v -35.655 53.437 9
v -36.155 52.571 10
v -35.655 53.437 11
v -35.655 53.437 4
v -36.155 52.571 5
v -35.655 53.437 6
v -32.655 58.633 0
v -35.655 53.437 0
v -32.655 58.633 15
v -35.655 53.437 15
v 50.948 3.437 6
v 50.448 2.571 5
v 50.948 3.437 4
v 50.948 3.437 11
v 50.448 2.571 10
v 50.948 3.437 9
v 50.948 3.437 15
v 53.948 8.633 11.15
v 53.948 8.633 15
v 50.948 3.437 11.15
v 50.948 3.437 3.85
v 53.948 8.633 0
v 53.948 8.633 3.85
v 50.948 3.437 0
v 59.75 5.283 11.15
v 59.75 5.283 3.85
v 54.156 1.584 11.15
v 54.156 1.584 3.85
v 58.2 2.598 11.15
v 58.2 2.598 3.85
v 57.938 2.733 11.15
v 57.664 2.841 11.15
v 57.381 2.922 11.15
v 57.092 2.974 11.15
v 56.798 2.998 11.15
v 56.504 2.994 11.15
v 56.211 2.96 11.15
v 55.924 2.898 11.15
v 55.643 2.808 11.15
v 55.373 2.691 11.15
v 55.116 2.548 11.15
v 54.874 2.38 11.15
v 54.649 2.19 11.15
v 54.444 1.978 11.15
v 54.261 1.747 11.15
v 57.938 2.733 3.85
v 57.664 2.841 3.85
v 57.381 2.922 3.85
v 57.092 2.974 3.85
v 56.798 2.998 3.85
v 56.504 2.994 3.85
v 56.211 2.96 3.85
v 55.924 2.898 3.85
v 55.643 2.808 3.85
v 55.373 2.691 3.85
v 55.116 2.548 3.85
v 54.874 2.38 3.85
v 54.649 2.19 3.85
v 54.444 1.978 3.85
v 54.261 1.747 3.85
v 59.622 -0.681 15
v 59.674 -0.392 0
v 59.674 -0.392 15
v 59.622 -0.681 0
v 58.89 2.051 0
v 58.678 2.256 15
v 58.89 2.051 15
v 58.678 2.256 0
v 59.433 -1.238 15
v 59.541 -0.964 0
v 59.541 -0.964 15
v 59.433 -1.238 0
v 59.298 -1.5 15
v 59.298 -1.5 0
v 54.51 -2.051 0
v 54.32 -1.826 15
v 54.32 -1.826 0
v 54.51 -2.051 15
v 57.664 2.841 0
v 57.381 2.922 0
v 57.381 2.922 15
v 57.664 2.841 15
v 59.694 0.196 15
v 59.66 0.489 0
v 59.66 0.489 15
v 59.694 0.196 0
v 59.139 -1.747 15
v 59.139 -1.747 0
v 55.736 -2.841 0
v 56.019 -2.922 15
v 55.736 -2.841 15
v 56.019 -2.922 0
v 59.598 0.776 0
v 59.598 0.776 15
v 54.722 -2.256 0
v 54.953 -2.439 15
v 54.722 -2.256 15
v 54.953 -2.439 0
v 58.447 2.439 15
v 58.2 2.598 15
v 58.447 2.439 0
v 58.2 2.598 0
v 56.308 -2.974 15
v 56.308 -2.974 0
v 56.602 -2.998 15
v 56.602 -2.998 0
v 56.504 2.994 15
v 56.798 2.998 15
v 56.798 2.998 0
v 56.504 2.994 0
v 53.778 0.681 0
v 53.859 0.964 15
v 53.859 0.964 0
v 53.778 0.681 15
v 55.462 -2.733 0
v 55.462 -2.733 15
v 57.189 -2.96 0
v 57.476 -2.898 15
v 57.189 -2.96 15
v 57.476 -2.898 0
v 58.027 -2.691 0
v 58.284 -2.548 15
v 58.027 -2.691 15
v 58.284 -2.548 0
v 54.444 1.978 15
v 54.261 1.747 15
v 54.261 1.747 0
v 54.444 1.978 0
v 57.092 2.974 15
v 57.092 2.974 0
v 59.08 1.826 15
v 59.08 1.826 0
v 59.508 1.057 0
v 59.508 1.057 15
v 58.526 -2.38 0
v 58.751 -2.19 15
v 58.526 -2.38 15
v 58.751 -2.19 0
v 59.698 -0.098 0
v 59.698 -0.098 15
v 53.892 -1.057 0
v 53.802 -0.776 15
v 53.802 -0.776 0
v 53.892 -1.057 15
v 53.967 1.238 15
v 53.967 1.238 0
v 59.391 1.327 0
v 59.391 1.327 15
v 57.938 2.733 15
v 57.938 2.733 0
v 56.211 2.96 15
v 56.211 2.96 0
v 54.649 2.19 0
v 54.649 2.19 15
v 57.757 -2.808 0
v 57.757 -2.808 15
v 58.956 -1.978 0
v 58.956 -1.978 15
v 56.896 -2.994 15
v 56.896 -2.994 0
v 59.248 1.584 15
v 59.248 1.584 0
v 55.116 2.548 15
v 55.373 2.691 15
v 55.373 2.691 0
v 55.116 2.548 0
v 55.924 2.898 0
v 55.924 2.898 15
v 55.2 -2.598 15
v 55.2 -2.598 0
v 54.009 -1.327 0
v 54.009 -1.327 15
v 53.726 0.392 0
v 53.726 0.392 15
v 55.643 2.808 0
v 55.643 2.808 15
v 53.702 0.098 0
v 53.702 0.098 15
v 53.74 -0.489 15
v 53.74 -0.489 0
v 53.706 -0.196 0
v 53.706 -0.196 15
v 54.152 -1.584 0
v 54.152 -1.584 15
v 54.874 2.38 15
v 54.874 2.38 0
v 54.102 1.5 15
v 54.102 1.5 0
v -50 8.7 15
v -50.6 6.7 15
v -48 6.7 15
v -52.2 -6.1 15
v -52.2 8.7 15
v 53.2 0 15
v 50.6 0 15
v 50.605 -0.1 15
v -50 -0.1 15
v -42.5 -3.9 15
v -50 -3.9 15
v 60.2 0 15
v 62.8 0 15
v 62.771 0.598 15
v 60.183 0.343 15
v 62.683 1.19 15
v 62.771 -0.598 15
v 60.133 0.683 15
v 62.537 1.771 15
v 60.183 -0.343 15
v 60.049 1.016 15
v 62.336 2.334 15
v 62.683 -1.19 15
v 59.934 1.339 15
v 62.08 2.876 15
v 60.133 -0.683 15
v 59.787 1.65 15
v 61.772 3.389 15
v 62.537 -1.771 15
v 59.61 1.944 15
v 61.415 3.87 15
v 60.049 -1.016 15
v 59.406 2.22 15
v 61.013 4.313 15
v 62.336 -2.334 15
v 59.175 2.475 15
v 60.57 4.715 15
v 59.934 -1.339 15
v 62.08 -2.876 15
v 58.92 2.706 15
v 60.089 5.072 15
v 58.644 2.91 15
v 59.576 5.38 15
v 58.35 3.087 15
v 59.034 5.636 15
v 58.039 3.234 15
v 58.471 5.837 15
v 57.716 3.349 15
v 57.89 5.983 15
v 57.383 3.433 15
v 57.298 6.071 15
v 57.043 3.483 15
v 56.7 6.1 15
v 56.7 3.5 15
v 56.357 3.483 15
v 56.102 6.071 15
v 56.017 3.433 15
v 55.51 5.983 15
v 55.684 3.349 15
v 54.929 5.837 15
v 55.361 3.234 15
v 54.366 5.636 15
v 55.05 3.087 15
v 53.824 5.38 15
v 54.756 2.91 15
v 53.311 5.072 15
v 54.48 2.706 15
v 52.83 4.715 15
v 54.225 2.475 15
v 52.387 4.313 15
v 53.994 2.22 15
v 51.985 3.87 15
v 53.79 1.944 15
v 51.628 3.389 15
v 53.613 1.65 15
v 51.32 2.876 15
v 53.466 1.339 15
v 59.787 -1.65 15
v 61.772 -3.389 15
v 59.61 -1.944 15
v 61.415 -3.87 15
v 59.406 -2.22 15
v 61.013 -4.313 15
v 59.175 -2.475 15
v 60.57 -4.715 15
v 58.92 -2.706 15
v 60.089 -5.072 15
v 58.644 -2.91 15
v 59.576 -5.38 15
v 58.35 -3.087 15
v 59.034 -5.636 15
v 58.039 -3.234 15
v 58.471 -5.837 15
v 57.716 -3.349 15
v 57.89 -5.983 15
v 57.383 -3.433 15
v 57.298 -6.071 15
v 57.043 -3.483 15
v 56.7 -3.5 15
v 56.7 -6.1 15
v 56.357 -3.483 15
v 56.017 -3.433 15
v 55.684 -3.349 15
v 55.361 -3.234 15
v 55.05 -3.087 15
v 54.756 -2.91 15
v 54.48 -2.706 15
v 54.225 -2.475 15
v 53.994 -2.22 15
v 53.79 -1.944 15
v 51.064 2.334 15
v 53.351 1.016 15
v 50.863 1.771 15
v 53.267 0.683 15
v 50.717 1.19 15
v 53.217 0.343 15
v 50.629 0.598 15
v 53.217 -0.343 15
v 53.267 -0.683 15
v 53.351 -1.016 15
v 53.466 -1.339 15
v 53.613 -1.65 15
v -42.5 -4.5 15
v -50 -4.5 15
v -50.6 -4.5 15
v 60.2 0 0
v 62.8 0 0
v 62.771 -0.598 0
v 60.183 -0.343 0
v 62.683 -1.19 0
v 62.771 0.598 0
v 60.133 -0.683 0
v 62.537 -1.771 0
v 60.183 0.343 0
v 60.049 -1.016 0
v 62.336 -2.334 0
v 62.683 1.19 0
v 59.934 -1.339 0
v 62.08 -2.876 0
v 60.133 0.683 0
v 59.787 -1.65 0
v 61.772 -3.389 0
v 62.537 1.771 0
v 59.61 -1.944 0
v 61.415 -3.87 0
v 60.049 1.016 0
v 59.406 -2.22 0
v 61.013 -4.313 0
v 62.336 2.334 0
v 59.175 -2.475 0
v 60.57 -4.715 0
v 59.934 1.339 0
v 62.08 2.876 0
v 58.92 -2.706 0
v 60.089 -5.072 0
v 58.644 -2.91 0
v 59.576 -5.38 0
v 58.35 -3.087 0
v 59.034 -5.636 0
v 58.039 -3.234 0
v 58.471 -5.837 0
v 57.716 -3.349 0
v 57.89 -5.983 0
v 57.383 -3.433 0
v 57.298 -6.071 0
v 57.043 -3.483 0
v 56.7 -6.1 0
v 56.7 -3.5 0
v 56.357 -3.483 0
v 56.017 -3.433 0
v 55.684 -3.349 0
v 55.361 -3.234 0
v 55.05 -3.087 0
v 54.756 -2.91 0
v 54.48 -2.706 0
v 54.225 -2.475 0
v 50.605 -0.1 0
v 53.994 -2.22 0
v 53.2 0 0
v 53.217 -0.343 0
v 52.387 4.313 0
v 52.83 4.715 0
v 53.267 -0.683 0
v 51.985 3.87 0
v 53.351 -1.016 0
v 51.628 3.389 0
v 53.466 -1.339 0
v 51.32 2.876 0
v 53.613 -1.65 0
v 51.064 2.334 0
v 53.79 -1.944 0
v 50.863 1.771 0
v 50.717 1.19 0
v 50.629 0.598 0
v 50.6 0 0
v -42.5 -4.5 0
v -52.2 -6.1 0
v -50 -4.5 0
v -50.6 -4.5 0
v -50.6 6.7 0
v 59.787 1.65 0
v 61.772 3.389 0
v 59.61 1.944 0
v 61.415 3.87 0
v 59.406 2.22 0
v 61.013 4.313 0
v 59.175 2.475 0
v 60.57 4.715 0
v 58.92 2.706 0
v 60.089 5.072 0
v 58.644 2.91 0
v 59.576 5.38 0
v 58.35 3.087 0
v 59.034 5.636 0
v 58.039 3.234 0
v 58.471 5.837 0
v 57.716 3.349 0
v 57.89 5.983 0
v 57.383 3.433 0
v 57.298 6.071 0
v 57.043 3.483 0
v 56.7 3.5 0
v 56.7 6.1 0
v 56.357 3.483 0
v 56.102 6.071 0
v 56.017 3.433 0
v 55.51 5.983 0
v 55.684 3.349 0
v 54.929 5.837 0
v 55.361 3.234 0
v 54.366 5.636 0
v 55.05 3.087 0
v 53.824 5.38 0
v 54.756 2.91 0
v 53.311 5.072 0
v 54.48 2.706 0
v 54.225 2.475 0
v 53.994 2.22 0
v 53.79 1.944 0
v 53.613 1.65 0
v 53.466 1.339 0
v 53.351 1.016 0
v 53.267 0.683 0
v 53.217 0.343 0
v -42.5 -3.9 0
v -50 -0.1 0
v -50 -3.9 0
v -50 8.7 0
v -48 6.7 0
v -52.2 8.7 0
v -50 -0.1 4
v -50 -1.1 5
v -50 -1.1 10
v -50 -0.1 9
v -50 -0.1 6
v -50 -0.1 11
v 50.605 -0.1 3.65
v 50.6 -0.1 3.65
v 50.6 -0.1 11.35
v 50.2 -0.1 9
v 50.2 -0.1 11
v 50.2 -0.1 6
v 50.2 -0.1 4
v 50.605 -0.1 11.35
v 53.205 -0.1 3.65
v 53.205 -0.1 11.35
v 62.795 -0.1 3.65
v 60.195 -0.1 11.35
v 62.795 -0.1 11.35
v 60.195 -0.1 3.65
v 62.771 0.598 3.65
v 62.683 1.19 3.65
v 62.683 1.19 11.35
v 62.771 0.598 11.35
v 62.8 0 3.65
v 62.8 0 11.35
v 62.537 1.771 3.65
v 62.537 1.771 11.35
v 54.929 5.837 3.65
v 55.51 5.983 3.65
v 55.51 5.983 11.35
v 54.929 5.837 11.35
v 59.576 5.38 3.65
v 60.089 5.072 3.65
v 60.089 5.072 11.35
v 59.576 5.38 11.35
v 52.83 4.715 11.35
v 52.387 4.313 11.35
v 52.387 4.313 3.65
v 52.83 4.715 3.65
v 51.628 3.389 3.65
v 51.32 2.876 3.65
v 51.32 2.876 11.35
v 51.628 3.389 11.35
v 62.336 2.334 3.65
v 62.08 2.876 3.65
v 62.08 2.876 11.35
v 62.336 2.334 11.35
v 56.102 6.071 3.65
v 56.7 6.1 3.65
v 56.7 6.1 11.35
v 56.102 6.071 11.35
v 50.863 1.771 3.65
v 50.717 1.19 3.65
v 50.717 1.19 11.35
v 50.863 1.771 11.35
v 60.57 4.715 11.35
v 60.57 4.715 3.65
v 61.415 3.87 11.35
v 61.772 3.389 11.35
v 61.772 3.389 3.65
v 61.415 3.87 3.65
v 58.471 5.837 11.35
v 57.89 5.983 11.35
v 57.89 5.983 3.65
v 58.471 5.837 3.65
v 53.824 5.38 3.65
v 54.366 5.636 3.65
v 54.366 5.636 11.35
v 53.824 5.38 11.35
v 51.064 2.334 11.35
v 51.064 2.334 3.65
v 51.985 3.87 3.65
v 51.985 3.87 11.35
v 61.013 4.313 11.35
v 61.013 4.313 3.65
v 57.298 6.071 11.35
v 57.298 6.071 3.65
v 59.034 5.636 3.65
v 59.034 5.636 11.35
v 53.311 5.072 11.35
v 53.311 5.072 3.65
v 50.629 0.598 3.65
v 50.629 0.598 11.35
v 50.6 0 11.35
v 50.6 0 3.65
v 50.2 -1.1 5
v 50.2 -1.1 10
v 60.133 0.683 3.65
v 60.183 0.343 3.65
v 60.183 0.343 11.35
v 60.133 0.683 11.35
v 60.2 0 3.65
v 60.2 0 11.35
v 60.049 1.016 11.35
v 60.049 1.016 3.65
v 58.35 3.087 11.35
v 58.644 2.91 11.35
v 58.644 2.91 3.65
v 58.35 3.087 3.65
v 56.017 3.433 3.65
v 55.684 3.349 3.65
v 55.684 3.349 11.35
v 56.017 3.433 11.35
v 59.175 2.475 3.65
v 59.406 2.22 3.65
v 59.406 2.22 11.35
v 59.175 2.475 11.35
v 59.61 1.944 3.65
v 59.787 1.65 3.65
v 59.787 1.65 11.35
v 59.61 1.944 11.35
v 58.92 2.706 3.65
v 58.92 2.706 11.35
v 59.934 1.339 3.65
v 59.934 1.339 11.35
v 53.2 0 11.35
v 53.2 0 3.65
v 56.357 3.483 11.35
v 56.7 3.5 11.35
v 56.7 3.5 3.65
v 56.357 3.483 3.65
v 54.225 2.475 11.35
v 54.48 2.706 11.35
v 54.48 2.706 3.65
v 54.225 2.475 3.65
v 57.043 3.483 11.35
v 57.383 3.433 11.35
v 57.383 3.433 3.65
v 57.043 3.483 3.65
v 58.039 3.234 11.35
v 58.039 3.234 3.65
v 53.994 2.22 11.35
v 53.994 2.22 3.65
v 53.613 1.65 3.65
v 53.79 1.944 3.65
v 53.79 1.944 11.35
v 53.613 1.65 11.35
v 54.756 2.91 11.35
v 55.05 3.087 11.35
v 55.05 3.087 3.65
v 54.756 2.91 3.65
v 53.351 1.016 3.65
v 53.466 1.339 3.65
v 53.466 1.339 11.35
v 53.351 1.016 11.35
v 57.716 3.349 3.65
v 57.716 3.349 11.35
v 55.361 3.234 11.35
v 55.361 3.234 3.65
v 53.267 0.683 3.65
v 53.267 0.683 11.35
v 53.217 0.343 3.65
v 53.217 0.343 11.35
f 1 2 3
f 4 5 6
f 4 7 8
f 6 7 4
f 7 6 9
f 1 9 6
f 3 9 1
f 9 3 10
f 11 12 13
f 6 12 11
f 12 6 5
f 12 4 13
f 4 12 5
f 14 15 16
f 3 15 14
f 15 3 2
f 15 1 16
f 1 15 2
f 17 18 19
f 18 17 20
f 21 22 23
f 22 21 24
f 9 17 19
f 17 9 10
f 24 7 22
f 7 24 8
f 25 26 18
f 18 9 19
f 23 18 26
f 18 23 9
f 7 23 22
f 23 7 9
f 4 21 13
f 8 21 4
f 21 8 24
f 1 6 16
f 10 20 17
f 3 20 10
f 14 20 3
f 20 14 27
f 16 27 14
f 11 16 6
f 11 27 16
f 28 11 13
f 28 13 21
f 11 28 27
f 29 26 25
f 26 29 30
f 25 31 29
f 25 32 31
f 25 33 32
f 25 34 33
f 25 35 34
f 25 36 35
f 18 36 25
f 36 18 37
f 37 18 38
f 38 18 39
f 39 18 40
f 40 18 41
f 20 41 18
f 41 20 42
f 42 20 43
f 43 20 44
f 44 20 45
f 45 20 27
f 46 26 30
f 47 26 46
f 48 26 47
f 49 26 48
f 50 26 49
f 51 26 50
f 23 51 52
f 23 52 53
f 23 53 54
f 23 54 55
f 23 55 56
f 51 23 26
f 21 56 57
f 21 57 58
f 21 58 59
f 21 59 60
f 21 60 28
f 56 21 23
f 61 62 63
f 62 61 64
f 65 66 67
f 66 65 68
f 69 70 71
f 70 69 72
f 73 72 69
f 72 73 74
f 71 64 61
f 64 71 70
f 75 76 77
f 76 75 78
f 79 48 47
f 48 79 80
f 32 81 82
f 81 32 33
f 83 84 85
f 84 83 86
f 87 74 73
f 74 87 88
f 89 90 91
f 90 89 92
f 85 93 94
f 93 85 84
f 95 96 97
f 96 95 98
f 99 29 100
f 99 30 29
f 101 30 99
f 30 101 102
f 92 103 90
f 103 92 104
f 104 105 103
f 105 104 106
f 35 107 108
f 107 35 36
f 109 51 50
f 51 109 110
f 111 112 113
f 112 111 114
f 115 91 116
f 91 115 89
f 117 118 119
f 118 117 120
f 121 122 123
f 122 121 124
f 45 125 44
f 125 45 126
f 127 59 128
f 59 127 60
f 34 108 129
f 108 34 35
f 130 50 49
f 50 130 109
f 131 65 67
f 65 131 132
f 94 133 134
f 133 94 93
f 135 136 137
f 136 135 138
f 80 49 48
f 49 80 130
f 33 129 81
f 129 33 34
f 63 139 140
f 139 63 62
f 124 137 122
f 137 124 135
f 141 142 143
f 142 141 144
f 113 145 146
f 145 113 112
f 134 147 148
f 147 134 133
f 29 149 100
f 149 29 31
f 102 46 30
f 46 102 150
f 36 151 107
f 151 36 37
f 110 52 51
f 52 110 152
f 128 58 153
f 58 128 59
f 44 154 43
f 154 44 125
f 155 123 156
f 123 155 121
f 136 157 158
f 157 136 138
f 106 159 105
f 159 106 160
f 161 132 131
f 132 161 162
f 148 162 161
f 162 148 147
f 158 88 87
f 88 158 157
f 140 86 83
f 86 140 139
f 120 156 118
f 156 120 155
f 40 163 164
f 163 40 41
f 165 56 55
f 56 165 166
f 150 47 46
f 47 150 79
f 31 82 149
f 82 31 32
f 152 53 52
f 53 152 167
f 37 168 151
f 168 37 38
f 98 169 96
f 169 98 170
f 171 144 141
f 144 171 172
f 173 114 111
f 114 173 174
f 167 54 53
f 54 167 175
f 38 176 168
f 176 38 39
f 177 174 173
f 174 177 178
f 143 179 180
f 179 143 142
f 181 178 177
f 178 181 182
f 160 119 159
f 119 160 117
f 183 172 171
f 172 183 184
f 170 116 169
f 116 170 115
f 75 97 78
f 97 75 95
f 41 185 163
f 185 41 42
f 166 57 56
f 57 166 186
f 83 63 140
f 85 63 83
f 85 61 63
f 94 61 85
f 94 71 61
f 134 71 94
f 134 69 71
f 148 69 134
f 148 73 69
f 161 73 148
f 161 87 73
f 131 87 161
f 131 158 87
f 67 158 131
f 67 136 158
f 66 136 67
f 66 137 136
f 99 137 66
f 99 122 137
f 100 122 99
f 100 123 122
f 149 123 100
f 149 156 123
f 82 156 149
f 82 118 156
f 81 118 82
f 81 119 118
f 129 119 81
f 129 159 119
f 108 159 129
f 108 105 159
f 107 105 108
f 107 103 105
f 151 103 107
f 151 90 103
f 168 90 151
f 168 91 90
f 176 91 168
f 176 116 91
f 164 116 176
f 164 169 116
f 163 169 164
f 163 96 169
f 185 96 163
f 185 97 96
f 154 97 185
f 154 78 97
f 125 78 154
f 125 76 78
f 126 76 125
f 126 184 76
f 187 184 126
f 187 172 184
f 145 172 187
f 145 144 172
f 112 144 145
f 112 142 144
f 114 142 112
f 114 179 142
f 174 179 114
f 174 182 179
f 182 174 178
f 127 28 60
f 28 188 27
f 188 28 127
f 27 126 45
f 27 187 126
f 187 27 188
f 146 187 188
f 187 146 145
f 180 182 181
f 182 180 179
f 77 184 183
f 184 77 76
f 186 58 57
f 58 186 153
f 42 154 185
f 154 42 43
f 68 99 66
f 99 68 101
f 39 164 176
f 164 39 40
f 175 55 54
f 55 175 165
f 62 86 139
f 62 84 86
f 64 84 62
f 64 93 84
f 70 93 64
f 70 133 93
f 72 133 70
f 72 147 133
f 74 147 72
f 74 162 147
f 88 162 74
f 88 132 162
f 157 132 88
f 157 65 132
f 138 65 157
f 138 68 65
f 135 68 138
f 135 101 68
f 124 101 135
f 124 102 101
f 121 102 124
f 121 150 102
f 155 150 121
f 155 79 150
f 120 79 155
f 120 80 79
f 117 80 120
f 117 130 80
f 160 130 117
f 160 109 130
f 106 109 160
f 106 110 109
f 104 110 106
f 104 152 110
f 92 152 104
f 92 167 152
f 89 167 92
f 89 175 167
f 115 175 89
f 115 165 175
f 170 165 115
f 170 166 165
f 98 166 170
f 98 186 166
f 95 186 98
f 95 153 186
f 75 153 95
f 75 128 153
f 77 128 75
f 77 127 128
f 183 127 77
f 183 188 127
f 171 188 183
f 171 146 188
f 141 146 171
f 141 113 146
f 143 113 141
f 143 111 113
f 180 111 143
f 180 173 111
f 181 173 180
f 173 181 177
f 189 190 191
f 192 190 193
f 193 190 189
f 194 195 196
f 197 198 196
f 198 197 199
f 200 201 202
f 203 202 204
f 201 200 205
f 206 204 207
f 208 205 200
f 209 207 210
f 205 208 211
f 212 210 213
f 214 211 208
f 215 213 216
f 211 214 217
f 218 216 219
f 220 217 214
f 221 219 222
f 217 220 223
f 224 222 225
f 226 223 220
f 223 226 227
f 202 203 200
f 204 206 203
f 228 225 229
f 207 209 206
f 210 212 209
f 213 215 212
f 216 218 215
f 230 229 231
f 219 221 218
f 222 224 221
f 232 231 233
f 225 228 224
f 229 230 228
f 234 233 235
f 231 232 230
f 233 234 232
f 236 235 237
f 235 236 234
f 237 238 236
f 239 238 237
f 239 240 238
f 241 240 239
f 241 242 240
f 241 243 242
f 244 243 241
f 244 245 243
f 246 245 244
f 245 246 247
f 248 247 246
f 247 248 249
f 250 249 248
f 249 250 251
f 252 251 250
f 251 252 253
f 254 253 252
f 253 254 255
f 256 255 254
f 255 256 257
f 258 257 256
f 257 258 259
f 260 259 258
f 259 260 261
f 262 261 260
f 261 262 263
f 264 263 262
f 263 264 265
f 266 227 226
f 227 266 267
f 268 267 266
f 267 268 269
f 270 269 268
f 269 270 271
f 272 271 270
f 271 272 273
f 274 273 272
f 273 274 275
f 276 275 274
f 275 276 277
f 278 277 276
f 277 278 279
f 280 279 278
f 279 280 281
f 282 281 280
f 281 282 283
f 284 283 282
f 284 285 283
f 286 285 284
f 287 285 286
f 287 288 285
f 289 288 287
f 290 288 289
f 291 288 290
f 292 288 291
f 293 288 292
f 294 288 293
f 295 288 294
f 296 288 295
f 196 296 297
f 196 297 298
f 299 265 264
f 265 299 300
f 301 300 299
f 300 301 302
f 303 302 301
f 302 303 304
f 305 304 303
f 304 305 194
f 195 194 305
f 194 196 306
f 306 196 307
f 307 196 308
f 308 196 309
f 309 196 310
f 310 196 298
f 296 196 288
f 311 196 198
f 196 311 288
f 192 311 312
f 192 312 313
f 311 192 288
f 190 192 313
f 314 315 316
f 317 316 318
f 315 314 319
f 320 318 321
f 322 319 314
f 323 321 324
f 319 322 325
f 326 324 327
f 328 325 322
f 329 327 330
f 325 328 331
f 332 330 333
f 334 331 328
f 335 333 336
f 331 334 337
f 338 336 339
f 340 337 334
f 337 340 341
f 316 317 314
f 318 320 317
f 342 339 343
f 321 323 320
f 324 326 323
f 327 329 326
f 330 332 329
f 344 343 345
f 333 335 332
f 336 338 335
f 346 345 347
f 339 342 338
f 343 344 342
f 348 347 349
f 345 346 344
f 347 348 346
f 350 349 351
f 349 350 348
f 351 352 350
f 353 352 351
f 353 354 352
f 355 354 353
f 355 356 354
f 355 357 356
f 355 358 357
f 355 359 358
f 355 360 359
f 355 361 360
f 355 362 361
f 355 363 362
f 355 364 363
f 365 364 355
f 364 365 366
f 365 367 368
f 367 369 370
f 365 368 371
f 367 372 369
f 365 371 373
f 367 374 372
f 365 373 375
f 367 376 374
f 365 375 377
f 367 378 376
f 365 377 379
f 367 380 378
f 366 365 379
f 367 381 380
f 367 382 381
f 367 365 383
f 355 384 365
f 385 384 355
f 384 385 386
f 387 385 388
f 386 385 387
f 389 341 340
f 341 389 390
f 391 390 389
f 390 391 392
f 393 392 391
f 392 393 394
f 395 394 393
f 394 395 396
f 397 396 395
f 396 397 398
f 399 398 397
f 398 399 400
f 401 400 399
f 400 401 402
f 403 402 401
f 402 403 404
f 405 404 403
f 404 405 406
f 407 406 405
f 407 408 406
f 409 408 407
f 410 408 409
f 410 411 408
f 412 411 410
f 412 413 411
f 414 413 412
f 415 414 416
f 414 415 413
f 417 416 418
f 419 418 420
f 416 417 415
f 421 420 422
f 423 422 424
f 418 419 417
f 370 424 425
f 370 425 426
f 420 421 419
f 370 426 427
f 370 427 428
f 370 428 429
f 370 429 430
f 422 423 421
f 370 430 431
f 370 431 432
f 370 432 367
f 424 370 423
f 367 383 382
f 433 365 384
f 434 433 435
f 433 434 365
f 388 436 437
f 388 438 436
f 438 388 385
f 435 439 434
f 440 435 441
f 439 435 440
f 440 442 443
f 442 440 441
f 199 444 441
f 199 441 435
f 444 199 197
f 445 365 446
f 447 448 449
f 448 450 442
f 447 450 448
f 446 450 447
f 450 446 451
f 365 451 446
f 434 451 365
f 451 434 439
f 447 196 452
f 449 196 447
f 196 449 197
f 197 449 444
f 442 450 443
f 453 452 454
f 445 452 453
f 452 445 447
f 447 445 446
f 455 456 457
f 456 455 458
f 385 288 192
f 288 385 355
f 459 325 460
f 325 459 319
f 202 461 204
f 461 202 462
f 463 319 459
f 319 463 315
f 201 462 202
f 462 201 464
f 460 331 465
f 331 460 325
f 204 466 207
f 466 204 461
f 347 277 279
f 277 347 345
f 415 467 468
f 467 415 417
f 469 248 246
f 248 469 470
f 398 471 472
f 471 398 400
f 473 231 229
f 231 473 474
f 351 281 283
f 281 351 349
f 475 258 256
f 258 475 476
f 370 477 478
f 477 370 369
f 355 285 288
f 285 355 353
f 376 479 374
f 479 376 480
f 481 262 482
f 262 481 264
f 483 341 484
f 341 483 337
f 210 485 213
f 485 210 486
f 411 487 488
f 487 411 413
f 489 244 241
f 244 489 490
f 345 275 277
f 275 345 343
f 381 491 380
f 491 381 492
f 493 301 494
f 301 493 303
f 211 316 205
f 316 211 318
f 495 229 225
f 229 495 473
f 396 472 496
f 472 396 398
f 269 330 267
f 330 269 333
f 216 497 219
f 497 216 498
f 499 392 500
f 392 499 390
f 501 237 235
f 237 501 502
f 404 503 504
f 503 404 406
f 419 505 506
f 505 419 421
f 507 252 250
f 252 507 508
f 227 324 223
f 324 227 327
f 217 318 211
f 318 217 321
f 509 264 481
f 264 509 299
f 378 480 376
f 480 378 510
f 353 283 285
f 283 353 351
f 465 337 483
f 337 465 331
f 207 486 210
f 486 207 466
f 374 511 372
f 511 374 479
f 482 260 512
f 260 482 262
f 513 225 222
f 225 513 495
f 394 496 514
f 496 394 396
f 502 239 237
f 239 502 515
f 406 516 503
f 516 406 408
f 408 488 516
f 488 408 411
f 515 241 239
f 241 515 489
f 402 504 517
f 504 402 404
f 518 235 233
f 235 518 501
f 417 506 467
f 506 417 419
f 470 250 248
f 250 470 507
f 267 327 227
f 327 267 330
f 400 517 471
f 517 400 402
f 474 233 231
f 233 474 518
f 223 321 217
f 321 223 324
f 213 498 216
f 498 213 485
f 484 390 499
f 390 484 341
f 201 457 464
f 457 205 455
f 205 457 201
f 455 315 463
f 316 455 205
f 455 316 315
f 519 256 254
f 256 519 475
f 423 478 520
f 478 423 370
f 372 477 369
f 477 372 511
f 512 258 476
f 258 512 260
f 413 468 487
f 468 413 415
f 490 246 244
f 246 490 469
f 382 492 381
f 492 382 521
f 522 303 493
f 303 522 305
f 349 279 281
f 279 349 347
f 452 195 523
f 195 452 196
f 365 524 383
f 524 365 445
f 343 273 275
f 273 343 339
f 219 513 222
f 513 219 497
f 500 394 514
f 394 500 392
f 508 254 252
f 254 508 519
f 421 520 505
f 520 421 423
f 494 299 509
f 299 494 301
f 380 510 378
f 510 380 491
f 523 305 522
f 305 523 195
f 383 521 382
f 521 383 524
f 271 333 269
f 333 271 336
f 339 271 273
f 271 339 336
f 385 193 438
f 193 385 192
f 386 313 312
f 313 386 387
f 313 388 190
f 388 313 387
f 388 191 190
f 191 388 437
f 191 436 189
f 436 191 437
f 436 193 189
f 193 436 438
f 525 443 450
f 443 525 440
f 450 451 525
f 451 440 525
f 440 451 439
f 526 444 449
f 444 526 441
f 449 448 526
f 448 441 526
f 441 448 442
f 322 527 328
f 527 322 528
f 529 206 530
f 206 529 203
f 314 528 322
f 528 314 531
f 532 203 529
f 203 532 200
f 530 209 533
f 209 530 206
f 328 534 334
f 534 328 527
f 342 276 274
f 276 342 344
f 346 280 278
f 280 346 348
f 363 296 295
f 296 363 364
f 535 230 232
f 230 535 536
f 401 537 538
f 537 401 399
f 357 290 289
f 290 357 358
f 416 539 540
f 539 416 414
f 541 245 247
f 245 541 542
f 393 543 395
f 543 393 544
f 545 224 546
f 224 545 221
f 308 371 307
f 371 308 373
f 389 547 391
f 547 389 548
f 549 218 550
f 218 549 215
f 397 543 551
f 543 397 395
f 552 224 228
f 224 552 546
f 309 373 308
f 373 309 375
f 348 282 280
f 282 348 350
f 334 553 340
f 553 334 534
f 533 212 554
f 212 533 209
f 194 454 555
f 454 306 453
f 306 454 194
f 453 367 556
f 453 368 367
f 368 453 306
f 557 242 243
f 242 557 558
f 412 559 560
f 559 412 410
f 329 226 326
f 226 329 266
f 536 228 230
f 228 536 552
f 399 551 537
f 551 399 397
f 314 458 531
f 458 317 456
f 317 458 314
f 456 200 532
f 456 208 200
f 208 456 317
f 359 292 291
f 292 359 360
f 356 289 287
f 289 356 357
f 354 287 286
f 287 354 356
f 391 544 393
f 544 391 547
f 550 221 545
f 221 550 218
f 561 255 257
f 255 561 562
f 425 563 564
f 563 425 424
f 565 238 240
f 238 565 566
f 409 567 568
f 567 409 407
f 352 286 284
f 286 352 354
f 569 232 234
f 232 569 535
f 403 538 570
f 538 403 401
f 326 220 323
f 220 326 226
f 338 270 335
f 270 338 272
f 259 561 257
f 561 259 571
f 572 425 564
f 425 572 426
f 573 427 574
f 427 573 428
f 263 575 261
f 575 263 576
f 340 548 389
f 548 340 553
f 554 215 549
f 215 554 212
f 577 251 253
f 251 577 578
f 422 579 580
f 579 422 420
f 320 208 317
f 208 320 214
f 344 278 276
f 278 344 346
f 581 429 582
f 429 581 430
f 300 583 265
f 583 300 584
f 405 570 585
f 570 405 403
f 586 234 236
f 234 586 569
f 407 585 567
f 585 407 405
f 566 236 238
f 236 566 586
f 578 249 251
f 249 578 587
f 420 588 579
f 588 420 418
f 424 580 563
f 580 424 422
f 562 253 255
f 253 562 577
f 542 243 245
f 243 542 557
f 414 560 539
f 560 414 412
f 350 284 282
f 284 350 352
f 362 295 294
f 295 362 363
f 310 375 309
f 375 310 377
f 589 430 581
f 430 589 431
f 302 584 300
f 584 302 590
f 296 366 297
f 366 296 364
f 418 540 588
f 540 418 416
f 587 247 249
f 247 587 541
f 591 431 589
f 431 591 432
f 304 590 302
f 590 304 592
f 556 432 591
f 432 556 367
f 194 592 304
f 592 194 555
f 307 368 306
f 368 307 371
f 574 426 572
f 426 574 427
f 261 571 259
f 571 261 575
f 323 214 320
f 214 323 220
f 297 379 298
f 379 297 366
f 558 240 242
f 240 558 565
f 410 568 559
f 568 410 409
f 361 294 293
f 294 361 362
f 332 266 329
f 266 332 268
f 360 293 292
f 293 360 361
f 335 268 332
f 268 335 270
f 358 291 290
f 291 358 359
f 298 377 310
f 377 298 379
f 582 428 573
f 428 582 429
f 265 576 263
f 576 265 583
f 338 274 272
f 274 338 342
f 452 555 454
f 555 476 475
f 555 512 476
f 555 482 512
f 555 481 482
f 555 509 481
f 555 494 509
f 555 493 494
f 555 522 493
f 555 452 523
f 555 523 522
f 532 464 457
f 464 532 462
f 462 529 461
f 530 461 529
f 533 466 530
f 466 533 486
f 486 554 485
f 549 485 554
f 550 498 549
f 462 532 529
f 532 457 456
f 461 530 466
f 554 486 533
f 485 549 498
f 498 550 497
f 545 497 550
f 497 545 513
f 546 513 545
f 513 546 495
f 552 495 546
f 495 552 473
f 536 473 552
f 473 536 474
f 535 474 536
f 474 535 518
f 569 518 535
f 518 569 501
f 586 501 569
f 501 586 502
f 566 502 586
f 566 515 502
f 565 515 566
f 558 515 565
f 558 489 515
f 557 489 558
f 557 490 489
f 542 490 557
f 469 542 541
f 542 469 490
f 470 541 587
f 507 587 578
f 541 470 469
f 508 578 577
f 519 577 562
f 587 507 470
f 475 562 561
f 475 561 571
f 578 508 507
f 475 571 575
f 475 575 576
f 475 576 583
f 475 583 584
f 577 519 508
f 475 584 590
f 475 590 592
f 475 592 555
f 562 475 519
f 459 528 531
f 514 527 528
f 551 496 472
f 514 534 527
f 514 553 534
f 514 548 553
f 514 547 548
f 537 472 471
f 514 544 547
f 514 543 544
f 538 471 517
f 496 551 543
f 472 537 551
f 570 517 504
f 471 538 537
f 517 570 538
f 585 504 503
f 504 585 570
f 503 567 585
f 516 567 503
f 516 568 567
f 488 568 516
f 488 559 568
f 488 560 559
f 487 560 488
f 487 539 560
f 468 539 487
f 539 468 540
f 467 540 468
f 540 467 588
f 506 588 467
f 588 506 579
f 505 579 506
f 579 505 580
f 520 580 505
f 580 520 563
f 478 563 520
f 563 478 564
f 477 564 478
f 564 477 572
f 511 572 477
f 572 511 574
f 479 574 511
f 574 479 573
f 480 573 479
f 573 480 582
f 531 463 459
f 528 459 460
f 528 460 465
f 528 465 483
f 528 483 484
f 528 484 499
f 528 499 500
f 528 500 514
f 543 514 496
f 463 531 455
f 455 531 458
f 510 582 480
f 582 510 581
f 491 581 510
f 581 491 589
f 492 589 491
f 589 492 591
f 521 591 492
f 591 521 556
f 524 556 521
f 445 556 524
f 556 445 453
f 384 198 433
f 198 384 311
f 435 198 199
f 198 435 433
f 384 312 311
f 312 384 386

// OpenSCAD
//!OpenSCAD

// The useable length of the Clip
Clip_Length = 100;
// The height of the clip
Clip_Height = 15;
// The thickness of one of the two arms
Arm_Thickness = 6;

// Your extrusion width (Width of the molten plastic trace of your nozzle - Usally your nozzle diameter)
Extrusion_Width = 0.4;
// Your layer height
Layer_Height = 0.2;

// The amount of noses and slots to create
Amount_Noses = 2;
// The length how far a nose is standing out
Noses_Size = 1;

// The angle how far the clip is opened
Opening_Angle = 30;

// How much the clip has to be bowed to snap (I recommend 2mm for PLA and 3mm for ABS)
Clip_Overstand = 2;

//Circle Resolution
$fn = 64;

translate([0,0,Clip_Height/2])
union() {
    // Upper part
    translate([Clip_Length/2 + Arm_Thickness + 1.75*Extrusion_Width, 0, 0])
        rotate([0, 0, -Opening_Angle])
            translate([-Clip_Length/2 - Arm_Thickness - 1.75*Extrusion_Width, 0, 0])
                union() {
                    translate([0,Arm_Thickness/2 + Extrusion_Width/4, 0])
                        cube([Clip_Length, Arm_Thickness, Clip_Height], center=true);
    
                    for(i = [1 : 1 : Amount_Noses]) 
                        translate([0, Extrusion_Width/4, -Clip_Height/2 + i*Clip_Height/(Amount_Noses + 1)])
                            rotate([45,0,0])
                                cube([Clip_Length, sqrt(2)*Noses_Size, sqrt(2)*Noses_Size], center=true);
    
                    translate([(Clip_Length + Arm_Thickness + 1.75*Extrusion_Width)/2, Arm_Thickness/2 + Extrusion_Width/4, 0])
                        cube([Arm_Thickness + 1.75*Extrusion_Width, Arm_Thickness, Clip_Height/2-Layer_Height], center=true);
    
                    translate([Clip_Length/2 + Arm_Thickness + 1.75*Extrusion_Width, 0, 0])
                        cylinder(r = Arm_Thickness/2, h = Clip_Height, center=true);
                }
    
    // Lower part
    difference() {
        union() {
            translate([(Arm_Thickness + 1.75*Extrusion_Width)/2, -Arm_Thickness/2 - Extrusion_Width/4, 0])
                cube([Clip_Length + Arm_Thickness + 1.75*Extrusion_Width, Arm_Thickness, Clip_Height], center=true);
            
            translate([Clip_Length/2 + Arm_Thickness + 1.75*Extrusion_Width, 0, 0])
                cylinder(r = Arm_Thickness + Extrusion_Width/4, h = Clip_Height, center=true);
            
            translate([-(Clip_Length + 5.5*Extrusion_Width)/2, -Arm_Thickness + 1.75*Extrusion_Width, 0])
                cube([5.5*Extrusion_Width, 4*Extrusion_Width, Clip_Height], center=true);
            
            translate([-Clip_Length/2 - 3.5*Extrusion_Width, 0.75*Extrusion_Width, 0])
                cube([4*Extrusion_Width, 2*Arm_Thickness + 2*Extrusion_Width, Clip_Height], center=true);
            
            translate([-Clip_Length/2 - 5.5*Extrusion_Width, Arm_Thickness + 1.75*Extrusion_Width , 0])
                polyhedron( points = [[0, 0, -Clip_Height/2], [Clip_Overstand + 5.5*Extrusion_Width, 0, -Clip_Height/2], [5.5*Extrusion_Width, Clip_Overstand, -Clip_Height/2], [0, Clip_Overstand, -Clip_Height/2], [0, 0, Clip_Height/2], [Clip_Overstand + 5.5*Extrusion_Width, 0, Clip_Height/2], [5.5*Extrusion_Width, Clip_Overstand, Clip_Height/2], [0, Clip_Overstand, Clip_Height/2]], faces = [[0,1,2,3], [4,7,6,5], [0,4,5,1], [1,5,6,2], [2,6,7,3], [3,7,4,0]], convexity = 10);
        }
        
        for(i = [1 : 1 : Amount_Noses]) 
            translate([Extrusion_Width/4, -Extrusion_Width/4, -Clip_Height/2 + i*Clip_Height/(Amount_Noses + 1)])
                rotate([45,0,0])
                    cube([Clip_Length + Extrusion_Width/2, sqrt(2)*Noses_Size, sqrt(2)*Noses_Size], center=true);
        
        translate([Clip_Length/2 + Arm_Thickness + 1.75*Extrusion_Width, 0, 0])
            cylinder(r = Arm_Thickness/2 + 1.25*Extrusion_Width, h = Clip_Height, center=true);
        
        translate([Clip_Length/2 + Arm_Thickness + 1.75*Extrusion_Width, Arm_Thickness/2, 0])
            cube([2*Arm_Thickness + Extrusion_Width/2, Arm_Thickness + Extrusion_Width/2, Clip_Height/2 + Layer_Height], center=true);
        
        translate([-Clip_Length/2 + Clip_Height/4, -Arm_Thickness + 4.5*Extrusion_Width, 0])
            cube([Clip_Height/2, 1.5*Extrusion_Width, Clip_Height], center=true);
    }
}
